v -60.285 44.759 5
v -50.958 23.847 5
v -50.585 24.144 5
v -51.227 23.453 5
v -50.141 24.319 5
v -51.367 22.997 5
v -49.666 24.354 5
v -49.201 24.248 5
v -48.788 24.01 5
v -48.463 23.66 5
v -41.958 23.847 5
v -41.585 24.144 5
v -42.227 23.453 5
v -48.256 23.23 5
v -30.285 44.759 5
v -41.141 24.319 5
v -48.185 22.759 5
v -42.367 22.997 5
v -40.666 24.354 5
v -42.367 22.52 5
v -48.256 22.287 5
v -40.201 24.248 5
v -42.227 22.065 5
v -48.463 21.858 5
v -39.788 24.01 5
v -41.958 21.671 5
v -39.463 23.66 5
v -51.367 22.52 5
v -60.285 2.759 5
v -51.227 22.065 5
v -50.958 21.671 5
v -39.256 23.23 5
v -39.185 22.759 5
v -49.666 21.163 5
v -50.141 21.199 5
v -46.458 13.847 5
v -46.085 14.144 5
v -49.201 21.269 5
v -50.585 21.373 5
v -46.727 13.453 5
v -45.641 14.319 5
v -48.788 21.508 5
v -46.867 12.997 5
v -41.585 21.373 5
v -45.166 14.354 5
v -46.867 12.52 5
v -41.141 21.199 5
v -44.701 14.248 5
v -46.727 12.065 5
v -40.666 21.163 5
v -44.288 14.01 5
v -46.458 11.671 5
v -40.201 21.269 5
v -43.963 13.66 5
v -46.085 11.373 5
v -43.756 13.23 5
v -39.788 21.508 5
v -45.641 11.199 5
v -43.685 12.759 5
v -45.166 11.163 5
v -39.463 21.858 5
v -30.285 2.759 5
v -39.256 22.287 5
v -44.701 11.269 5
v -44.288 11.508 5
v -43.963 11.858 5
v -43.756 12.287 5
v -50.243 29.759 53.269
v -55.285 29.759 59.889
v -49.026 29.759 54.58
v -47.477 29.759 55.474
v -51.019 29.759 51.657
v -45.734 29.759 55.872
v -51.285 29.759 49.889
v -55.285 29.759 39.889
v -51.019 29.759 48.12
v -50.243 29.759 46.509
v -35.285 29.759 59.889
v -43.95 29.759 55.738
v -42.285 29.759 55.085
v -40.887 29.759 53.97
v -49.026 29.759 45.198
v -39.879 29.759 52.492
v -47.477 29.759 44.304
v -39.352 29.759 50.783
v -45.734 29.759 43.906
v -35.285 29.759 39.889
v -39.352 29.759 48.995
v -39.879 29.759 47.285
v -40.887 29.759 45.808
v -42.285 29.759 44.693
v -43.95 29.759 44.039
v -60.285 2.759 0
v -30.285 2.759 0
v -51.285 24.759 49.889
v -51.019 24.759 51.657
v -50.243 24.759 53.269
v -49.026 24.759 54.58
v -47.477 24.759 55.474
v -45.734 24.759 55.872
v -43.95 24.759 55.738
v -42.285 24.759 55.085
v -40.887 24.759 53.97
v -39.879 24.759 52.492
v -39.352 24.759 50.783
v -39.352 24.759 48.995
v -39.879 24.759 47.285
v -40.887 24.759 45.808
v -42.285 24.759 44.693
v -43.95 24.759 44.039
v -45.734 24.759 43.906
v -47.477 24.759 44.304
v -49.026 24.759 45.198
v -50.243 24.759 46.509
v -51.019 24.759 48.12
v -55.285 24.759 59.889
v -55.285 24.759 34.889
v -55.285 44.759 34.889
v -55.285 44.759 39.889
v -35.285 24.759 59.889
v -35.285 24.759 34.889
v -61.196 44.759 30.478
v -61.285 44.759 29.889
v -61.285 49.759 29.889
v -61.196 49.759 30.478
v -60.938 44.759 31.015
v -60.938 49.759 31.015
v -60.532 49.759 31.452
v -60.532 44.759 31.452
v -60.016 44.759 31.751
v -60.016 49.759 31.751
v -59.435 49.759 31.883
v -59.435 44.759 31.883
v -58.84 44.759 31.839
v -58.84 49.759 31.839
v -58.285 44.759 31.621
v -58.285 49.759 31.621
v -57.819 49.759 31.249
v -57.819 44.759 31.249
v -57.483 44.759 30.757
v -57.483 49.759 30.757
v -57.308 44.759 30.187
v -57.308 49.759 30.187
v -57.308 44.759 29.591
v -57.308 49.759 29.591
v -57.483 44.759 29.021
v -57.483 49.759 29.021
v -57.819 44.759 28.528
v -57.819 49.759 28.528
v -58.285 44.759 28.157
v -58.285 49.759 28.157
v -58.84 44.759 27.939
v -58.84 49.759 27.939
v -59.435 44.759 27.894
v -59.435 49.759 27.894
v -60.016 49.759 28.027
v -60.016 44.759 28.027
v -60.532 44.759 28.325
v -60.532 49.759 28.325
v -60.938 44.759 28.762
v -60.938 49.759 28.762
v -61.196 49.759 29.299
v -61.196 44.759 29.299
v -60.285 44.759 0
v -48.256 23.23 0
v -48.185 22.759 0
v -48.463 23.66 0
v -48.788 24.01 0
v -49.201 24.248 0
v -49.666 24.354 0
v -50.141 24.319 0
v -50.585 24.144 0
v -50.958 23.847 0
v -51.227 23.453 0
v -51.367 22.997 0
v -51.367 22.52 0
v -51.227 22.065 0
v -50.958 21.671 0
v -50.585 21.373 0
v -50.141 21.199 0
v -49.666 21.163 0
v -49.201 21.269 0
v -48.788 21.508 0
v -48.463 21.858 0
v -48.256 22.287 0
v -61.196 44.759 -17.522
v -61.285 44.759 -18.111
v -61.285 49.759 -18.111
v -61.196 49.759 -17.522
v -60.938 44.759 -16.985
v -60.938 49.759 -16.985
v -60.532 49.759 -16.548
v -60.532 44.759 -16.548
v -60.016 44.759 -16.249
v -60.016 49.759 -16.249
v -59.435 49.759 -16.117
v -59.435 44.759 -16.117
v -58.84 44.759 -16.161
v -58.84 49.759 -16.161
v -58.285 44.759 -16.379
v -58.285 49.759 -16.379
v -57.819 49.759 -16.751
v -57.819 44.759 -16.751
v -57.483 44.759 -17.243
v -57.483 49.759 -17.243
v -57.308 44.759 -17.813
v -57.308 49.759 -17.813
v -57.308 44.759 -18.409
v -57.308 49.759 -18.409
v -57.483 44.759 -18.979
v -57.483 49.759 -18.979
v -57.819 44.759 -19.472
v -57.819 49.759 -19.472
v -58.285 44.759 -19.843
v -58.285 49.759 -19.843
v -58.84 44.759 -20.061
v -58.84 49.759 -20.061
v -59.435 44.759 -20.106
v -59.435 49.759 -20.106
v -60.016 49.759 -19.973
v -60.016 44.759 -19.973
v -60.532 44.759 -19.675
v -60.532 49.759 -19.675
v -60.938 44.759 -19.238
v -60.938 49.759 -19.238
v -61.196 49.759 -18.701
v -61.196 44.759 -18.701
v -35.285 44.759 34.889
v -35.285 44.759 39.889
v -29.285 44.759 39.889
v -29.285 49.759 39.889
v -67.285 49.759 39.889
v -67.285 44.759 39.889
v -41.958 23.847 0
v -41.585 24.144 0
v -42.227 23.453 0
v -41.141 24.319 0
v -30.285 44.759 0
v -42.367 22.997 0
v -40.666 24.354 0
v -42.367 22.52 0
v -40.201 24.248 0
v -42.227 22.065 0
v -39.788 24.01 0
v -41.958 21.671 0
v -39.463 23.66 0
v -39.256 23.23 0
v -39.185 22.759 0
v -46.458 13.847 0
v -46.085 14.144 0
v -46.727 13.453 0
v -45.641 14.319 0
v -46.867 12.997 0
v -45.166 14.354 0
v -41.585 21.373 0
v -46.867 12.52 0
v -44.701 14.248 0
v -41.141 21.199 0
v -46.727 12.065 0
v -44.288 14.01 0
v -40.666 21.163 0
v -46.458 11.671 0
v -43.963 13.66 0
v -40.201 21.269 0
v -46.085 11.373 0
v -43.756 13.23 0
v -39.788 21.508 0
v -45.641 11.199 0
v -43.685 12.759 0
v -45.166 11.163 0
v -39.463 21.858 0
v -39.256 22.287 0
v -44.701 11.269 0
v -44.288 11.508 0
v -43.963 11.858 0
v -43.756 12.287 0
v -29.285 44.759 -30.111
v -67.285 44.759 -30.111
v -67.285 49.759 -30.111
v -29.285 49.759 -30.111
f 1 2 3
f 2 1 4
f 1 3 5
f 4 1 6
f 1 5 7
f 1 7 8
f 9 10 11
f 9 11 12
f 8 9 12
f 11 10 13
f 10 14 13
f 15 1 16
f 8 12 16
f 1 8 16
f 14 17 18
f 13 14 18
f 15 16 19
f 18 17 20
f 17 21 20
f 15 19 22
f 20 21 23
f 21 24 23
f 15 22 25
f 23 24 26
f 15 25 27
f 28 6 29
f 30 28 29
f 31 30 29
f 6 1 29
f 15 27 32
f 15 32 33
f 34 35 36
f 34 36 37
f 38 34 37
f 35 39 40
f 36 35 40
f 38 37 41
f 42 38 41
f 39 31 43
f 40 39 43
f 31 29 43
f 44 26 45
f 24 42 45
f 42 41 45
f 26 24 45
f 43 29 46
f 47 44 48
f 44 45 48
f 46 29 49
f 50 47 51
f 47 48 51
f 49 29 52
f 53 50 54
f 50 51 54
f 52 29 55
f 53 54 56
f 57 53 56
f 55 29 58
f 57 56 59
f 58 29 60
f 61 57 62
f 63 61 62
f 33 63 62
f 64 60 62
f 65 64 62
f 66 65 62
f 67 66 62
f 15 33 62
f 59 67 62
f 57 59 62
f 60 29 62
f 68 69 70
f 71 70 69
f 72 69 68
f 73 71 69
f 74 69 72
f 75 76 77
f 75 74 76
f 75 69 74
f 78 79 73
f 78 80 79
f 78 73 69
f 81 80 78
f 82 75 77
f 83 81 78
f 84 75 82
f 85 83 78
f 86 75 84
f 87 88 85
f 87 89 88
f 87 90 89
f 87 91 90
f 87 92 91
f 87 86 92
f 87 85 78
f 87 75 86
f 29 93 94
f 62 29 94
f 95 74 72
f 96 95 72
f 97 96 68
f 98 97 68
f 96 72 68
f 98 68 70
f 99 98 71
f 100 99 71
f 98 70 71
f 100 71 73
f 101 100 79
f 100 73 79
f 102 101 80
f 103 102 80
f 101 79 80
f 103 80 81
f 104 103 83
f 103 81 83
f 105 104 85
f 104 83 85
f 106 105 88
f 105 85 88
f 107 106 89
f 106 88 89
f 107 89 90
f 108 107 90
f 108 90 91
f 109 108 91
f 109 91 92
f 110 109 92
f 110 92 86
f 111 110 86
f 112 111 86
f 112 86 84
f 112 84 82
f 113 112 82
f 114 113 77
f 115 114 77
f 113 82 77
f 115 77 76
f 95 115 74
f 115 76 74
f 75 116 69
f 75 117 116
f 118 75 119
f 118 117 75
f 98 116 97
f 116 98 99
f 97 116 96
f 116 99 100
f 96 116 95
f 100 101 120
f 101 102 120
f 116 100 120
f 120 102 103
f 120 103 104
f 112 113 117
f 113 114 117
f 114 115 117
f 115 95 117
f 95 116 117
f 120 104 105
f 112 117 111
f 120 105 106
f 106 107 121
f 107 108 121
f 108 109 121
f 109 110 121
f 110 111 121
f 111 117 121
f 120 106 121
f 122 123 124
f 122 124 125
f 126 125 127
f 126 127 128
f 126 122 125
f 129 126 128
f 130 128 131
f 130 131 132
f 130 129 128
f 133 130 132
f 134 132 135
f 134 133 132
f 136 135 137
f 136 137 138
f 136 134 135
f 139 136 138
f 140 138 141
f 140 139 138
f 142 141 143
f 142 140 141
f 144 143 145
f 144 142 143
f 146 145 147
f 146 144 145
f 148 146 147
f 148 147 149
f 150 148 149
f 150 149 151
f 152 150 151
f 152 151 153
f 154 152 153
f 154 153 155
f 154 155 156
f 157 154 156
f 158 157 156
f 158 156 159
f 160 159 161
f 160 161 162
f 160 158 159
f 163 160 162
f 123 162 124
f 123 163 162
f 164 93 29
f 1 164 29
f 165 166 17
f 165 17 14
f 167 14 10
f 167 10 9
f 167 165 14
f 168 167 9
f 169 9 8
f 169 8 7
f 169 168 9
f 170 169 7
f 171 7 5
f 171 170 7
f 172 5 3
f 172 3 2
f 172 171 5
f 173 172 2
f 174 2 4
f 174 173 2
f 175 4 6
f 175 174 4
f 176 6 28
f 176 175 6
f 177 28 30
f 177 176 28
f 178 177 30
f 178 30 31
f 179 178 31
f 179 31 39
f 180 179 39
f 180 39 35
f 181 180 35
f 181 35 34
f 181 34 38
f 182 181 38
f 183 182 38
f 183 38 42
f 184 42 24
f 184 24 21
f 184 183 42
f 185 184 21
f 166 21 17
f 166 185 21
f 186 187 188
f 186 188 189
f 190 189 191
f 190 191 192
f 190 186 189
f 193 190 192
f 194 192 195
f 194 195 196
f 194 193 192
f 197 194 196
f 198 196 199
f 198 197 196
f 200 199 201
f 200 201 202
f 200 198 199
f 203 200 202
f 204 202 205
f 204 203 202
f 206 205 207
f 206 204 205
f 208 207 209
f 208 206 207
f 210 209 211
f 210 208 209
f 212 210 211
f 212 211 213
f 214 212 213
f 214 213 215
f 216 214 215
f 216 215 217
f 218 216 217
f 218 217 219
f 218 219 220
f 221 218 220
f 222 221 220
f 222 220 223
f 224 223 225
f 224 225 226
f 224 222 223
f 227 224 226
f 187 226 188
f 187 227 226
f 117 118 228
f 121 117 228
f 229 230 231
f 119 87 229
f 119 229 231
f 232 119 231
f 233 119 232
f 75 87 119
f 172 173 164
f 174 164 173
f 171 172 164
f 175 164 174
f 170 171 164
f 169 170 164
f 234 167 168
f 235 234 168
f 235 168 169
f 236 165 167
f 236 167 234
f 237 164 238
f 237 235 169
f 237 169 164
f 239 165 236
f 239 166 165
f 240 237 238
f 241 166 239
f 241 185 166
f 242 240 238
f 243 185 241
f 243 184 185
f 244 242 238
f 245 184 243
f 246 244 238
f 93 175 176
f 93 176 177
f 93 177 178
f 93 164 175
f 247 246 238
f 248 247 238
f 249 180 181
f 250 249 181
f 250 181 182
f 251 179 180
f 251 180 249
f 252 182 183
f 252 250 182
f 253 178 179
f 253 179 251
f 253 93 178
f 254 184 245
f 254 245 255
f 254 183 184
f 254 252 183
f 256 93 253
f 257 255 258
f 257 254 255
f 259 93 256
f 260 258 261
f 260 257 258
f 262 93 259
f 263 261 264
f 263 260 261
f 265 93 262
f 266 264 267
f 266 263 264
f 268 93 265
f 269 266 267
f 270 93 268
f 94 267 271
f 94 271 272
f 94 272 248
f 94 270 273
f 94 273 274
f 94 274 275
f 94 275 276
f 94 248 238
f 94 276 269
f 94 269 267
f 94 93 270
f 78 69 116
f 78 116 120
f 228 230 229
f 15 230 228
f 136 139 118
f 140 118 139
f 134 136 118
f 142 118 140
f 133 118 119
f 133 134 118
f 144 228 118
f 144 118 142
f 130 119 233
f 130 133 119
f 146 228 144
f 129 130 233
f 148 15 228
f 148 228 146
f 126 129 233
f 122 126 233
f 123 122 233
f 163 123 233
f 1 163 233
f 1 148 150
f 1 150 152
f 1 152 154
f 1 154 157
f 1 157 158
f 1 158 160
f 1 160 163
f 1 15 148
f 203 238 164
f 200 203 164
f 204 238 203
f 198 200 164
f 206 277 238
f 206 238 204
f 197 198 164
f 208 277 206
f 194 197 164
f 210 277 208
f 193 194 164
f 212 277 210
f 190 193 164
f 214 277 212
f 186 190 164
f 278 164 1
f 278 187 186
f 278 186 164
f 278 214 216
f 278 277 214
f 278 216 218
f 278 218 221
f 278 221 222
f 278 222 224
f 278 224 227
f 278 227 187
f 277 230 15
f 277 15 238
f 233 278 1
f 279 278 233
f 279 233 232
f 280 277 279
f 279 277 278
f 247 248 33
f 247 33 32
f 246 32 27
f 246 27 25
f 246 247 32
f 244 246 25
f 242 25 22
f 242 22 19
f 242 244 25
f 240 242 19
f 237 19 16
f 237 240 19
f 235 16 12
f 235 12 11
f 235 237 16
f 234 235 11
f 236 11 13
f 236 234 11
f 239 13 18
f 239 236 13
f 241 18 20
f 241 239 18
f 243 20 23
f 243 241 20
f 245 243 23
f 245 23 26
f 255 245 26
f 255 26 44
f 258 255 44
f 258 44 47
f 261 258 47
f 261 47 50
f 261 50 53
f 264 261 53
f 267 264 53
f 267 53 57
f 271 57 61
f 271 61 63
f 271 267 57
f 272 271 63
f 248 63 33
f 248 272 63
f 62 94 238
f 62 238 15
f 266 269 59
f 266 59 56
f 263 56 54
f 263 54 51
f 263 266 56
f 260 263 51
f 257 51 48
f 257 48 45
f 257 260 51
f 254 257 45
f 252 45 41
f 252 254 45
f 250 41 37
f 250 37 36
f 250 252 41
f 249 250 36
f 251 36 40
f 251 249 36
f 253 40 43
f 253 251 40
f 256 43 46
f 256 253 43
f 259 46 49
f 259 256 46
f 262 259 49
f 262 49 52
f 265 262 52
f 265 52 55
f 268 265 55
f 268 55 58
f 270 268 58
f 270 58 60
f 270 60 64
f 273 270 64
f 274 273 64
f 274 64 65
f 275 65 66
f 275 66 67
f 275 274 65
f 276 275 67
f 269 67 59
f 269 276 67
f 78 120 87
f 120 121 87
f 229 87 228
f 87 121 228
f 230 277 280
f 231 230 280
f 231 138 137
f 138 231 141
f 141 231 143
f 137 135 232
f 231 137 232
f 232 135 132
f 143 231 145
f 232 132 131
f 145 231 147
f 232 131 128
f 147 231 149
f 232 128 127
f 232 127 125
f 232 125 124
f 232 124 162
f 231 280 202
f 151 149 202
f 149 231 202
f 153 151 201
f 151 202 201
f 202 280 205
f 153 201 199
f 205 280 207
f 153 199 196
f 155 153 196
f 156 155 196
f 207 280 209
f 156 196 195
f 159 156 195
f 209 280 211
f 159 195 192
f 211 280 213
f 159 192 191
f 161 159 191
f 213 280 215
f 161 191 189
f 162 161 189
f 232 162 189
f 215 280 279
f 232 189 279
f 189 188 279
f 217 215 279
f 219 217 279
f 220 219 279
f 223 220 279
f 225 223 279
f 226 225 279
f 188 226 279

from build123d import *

# Parameters (mm, degrees)
F0_W      = 30
F0_H      = 30
F0_R      = 1.6
F1_DEPTH  = 5
F2_DEPTH  = 12
F3_W      = 38
F3_H      = 65
F3_R      = 2
F3_W_2    = 30
F3_H_2    = 5
F4_DEPTH  = 5
F5_DEPTH  = 5
F7_DEPTH  = 20
F8_W      = 20
F8_H      = 5
F9_DEPTH  = 20
F10_R     = 6
F11_DEPTH = 5


with BuildPart() as f1:
    # F0 (on Top) → F1 (new body)
    with BuildSketch(Plane.XY):
        with Locations((-45.2852314338, 17.7588454891)):
            Rectangle(F0_W, F0_H)
        with Locations((-45.2852314338, 12.7588454891)):
            Circle(F0_R, mode=Mode.SUBTRACT)
        with Locations((-49.7852314338, 22.7588454891)):
            Circle(F0_R, mode=Mode.SUBTRACT)
        with Locations((-40.7852314338, 22.7588454891)):
            Circle(F0_R, mode=Mode.SUBTRACT)
    extrude(amount=F1_DEPTH)

    # F2 (add): a face of the model
    f2_faces = [f1.faces().sort_by_distance(p)[0] for p in [
        (-45.2852314338, 32.7588454891, 2.5),
    ]]
    extrude(f2_faces, amount=F2_DEPTH)

    # F3 (on face) → F4 (join)
    with BuildSketch(Plane(origin=(0, 44.7588454891, 0), x_dir=(-1, 0, 0), z_dir=(0, 1, 0))):
        with Locations((48.2852314338, 2.3887734723)):
            Rectangle(F3_W, F3_H)
        with Locations((59.2852314338, -18.1112265277)):
            Circle(F3_R, mode=Mode.SUBTRACT)
        with Locations((45.2852314338, 2.5)):
            Rectangle(F3_W_2, F3_H_2, mode=Mode.SUBTRACT)
        with Locations((59.2852314338, 29.8887734723)):
            Circle(F3_R, mode=Mode.SUBTRACT)
        with Locations((45.2852314338, 2.5)):
            Rectangle(F3_W_2, F3_H_2)
    extrude(amount=F4_DEPTH)

    # F5 (add): a face of the model
    f5_faces = [f1.faces().sort_by_distance(p)[0] for p in [
        (-48.2852314338, 47.2588454891, 34.8887734723),
    ]]
    extrude(f5_faces, amount=F5_DEPTH)

    # F6 (on face) → F7 (join)
    with BuildSketch(Plane.XZ.offset(-44.7588454891)):
        Polygon((-35.2852314338, 39.8887734723), (-55.2852314338, 39.8887734723), (-55.2852314338, 34.8887734723), (-45.2852314338, 34.8887734723), (-35.2852314338, 34.8887734723), align=None)
    extrude(amount=F7_DEPTH)

    # F8 (on face) → F9 (join)
    with BuildSketch(Plane.XY.offset(39.8887734723)):
        with Locations((-45.2852314338, 27.2588454891)):
            Rectangle(F8_W, F8_H)
    extrude(amount=F9_DEPTH)

    # F10 (on face) → F11 (cut)
    with BuildSketch(Plane(origin=(0, 29.7588454891, 0), x_dir=(-1, 0, 0), z_dir=(0, 1, 0))):
        with Locations((45.2852314338, 49.8887734723)):
            Circle(F10_R)
    extrude(amount=-F11_DEPTH, mode=Mode.SUBTRACT)


solid = f1.part
